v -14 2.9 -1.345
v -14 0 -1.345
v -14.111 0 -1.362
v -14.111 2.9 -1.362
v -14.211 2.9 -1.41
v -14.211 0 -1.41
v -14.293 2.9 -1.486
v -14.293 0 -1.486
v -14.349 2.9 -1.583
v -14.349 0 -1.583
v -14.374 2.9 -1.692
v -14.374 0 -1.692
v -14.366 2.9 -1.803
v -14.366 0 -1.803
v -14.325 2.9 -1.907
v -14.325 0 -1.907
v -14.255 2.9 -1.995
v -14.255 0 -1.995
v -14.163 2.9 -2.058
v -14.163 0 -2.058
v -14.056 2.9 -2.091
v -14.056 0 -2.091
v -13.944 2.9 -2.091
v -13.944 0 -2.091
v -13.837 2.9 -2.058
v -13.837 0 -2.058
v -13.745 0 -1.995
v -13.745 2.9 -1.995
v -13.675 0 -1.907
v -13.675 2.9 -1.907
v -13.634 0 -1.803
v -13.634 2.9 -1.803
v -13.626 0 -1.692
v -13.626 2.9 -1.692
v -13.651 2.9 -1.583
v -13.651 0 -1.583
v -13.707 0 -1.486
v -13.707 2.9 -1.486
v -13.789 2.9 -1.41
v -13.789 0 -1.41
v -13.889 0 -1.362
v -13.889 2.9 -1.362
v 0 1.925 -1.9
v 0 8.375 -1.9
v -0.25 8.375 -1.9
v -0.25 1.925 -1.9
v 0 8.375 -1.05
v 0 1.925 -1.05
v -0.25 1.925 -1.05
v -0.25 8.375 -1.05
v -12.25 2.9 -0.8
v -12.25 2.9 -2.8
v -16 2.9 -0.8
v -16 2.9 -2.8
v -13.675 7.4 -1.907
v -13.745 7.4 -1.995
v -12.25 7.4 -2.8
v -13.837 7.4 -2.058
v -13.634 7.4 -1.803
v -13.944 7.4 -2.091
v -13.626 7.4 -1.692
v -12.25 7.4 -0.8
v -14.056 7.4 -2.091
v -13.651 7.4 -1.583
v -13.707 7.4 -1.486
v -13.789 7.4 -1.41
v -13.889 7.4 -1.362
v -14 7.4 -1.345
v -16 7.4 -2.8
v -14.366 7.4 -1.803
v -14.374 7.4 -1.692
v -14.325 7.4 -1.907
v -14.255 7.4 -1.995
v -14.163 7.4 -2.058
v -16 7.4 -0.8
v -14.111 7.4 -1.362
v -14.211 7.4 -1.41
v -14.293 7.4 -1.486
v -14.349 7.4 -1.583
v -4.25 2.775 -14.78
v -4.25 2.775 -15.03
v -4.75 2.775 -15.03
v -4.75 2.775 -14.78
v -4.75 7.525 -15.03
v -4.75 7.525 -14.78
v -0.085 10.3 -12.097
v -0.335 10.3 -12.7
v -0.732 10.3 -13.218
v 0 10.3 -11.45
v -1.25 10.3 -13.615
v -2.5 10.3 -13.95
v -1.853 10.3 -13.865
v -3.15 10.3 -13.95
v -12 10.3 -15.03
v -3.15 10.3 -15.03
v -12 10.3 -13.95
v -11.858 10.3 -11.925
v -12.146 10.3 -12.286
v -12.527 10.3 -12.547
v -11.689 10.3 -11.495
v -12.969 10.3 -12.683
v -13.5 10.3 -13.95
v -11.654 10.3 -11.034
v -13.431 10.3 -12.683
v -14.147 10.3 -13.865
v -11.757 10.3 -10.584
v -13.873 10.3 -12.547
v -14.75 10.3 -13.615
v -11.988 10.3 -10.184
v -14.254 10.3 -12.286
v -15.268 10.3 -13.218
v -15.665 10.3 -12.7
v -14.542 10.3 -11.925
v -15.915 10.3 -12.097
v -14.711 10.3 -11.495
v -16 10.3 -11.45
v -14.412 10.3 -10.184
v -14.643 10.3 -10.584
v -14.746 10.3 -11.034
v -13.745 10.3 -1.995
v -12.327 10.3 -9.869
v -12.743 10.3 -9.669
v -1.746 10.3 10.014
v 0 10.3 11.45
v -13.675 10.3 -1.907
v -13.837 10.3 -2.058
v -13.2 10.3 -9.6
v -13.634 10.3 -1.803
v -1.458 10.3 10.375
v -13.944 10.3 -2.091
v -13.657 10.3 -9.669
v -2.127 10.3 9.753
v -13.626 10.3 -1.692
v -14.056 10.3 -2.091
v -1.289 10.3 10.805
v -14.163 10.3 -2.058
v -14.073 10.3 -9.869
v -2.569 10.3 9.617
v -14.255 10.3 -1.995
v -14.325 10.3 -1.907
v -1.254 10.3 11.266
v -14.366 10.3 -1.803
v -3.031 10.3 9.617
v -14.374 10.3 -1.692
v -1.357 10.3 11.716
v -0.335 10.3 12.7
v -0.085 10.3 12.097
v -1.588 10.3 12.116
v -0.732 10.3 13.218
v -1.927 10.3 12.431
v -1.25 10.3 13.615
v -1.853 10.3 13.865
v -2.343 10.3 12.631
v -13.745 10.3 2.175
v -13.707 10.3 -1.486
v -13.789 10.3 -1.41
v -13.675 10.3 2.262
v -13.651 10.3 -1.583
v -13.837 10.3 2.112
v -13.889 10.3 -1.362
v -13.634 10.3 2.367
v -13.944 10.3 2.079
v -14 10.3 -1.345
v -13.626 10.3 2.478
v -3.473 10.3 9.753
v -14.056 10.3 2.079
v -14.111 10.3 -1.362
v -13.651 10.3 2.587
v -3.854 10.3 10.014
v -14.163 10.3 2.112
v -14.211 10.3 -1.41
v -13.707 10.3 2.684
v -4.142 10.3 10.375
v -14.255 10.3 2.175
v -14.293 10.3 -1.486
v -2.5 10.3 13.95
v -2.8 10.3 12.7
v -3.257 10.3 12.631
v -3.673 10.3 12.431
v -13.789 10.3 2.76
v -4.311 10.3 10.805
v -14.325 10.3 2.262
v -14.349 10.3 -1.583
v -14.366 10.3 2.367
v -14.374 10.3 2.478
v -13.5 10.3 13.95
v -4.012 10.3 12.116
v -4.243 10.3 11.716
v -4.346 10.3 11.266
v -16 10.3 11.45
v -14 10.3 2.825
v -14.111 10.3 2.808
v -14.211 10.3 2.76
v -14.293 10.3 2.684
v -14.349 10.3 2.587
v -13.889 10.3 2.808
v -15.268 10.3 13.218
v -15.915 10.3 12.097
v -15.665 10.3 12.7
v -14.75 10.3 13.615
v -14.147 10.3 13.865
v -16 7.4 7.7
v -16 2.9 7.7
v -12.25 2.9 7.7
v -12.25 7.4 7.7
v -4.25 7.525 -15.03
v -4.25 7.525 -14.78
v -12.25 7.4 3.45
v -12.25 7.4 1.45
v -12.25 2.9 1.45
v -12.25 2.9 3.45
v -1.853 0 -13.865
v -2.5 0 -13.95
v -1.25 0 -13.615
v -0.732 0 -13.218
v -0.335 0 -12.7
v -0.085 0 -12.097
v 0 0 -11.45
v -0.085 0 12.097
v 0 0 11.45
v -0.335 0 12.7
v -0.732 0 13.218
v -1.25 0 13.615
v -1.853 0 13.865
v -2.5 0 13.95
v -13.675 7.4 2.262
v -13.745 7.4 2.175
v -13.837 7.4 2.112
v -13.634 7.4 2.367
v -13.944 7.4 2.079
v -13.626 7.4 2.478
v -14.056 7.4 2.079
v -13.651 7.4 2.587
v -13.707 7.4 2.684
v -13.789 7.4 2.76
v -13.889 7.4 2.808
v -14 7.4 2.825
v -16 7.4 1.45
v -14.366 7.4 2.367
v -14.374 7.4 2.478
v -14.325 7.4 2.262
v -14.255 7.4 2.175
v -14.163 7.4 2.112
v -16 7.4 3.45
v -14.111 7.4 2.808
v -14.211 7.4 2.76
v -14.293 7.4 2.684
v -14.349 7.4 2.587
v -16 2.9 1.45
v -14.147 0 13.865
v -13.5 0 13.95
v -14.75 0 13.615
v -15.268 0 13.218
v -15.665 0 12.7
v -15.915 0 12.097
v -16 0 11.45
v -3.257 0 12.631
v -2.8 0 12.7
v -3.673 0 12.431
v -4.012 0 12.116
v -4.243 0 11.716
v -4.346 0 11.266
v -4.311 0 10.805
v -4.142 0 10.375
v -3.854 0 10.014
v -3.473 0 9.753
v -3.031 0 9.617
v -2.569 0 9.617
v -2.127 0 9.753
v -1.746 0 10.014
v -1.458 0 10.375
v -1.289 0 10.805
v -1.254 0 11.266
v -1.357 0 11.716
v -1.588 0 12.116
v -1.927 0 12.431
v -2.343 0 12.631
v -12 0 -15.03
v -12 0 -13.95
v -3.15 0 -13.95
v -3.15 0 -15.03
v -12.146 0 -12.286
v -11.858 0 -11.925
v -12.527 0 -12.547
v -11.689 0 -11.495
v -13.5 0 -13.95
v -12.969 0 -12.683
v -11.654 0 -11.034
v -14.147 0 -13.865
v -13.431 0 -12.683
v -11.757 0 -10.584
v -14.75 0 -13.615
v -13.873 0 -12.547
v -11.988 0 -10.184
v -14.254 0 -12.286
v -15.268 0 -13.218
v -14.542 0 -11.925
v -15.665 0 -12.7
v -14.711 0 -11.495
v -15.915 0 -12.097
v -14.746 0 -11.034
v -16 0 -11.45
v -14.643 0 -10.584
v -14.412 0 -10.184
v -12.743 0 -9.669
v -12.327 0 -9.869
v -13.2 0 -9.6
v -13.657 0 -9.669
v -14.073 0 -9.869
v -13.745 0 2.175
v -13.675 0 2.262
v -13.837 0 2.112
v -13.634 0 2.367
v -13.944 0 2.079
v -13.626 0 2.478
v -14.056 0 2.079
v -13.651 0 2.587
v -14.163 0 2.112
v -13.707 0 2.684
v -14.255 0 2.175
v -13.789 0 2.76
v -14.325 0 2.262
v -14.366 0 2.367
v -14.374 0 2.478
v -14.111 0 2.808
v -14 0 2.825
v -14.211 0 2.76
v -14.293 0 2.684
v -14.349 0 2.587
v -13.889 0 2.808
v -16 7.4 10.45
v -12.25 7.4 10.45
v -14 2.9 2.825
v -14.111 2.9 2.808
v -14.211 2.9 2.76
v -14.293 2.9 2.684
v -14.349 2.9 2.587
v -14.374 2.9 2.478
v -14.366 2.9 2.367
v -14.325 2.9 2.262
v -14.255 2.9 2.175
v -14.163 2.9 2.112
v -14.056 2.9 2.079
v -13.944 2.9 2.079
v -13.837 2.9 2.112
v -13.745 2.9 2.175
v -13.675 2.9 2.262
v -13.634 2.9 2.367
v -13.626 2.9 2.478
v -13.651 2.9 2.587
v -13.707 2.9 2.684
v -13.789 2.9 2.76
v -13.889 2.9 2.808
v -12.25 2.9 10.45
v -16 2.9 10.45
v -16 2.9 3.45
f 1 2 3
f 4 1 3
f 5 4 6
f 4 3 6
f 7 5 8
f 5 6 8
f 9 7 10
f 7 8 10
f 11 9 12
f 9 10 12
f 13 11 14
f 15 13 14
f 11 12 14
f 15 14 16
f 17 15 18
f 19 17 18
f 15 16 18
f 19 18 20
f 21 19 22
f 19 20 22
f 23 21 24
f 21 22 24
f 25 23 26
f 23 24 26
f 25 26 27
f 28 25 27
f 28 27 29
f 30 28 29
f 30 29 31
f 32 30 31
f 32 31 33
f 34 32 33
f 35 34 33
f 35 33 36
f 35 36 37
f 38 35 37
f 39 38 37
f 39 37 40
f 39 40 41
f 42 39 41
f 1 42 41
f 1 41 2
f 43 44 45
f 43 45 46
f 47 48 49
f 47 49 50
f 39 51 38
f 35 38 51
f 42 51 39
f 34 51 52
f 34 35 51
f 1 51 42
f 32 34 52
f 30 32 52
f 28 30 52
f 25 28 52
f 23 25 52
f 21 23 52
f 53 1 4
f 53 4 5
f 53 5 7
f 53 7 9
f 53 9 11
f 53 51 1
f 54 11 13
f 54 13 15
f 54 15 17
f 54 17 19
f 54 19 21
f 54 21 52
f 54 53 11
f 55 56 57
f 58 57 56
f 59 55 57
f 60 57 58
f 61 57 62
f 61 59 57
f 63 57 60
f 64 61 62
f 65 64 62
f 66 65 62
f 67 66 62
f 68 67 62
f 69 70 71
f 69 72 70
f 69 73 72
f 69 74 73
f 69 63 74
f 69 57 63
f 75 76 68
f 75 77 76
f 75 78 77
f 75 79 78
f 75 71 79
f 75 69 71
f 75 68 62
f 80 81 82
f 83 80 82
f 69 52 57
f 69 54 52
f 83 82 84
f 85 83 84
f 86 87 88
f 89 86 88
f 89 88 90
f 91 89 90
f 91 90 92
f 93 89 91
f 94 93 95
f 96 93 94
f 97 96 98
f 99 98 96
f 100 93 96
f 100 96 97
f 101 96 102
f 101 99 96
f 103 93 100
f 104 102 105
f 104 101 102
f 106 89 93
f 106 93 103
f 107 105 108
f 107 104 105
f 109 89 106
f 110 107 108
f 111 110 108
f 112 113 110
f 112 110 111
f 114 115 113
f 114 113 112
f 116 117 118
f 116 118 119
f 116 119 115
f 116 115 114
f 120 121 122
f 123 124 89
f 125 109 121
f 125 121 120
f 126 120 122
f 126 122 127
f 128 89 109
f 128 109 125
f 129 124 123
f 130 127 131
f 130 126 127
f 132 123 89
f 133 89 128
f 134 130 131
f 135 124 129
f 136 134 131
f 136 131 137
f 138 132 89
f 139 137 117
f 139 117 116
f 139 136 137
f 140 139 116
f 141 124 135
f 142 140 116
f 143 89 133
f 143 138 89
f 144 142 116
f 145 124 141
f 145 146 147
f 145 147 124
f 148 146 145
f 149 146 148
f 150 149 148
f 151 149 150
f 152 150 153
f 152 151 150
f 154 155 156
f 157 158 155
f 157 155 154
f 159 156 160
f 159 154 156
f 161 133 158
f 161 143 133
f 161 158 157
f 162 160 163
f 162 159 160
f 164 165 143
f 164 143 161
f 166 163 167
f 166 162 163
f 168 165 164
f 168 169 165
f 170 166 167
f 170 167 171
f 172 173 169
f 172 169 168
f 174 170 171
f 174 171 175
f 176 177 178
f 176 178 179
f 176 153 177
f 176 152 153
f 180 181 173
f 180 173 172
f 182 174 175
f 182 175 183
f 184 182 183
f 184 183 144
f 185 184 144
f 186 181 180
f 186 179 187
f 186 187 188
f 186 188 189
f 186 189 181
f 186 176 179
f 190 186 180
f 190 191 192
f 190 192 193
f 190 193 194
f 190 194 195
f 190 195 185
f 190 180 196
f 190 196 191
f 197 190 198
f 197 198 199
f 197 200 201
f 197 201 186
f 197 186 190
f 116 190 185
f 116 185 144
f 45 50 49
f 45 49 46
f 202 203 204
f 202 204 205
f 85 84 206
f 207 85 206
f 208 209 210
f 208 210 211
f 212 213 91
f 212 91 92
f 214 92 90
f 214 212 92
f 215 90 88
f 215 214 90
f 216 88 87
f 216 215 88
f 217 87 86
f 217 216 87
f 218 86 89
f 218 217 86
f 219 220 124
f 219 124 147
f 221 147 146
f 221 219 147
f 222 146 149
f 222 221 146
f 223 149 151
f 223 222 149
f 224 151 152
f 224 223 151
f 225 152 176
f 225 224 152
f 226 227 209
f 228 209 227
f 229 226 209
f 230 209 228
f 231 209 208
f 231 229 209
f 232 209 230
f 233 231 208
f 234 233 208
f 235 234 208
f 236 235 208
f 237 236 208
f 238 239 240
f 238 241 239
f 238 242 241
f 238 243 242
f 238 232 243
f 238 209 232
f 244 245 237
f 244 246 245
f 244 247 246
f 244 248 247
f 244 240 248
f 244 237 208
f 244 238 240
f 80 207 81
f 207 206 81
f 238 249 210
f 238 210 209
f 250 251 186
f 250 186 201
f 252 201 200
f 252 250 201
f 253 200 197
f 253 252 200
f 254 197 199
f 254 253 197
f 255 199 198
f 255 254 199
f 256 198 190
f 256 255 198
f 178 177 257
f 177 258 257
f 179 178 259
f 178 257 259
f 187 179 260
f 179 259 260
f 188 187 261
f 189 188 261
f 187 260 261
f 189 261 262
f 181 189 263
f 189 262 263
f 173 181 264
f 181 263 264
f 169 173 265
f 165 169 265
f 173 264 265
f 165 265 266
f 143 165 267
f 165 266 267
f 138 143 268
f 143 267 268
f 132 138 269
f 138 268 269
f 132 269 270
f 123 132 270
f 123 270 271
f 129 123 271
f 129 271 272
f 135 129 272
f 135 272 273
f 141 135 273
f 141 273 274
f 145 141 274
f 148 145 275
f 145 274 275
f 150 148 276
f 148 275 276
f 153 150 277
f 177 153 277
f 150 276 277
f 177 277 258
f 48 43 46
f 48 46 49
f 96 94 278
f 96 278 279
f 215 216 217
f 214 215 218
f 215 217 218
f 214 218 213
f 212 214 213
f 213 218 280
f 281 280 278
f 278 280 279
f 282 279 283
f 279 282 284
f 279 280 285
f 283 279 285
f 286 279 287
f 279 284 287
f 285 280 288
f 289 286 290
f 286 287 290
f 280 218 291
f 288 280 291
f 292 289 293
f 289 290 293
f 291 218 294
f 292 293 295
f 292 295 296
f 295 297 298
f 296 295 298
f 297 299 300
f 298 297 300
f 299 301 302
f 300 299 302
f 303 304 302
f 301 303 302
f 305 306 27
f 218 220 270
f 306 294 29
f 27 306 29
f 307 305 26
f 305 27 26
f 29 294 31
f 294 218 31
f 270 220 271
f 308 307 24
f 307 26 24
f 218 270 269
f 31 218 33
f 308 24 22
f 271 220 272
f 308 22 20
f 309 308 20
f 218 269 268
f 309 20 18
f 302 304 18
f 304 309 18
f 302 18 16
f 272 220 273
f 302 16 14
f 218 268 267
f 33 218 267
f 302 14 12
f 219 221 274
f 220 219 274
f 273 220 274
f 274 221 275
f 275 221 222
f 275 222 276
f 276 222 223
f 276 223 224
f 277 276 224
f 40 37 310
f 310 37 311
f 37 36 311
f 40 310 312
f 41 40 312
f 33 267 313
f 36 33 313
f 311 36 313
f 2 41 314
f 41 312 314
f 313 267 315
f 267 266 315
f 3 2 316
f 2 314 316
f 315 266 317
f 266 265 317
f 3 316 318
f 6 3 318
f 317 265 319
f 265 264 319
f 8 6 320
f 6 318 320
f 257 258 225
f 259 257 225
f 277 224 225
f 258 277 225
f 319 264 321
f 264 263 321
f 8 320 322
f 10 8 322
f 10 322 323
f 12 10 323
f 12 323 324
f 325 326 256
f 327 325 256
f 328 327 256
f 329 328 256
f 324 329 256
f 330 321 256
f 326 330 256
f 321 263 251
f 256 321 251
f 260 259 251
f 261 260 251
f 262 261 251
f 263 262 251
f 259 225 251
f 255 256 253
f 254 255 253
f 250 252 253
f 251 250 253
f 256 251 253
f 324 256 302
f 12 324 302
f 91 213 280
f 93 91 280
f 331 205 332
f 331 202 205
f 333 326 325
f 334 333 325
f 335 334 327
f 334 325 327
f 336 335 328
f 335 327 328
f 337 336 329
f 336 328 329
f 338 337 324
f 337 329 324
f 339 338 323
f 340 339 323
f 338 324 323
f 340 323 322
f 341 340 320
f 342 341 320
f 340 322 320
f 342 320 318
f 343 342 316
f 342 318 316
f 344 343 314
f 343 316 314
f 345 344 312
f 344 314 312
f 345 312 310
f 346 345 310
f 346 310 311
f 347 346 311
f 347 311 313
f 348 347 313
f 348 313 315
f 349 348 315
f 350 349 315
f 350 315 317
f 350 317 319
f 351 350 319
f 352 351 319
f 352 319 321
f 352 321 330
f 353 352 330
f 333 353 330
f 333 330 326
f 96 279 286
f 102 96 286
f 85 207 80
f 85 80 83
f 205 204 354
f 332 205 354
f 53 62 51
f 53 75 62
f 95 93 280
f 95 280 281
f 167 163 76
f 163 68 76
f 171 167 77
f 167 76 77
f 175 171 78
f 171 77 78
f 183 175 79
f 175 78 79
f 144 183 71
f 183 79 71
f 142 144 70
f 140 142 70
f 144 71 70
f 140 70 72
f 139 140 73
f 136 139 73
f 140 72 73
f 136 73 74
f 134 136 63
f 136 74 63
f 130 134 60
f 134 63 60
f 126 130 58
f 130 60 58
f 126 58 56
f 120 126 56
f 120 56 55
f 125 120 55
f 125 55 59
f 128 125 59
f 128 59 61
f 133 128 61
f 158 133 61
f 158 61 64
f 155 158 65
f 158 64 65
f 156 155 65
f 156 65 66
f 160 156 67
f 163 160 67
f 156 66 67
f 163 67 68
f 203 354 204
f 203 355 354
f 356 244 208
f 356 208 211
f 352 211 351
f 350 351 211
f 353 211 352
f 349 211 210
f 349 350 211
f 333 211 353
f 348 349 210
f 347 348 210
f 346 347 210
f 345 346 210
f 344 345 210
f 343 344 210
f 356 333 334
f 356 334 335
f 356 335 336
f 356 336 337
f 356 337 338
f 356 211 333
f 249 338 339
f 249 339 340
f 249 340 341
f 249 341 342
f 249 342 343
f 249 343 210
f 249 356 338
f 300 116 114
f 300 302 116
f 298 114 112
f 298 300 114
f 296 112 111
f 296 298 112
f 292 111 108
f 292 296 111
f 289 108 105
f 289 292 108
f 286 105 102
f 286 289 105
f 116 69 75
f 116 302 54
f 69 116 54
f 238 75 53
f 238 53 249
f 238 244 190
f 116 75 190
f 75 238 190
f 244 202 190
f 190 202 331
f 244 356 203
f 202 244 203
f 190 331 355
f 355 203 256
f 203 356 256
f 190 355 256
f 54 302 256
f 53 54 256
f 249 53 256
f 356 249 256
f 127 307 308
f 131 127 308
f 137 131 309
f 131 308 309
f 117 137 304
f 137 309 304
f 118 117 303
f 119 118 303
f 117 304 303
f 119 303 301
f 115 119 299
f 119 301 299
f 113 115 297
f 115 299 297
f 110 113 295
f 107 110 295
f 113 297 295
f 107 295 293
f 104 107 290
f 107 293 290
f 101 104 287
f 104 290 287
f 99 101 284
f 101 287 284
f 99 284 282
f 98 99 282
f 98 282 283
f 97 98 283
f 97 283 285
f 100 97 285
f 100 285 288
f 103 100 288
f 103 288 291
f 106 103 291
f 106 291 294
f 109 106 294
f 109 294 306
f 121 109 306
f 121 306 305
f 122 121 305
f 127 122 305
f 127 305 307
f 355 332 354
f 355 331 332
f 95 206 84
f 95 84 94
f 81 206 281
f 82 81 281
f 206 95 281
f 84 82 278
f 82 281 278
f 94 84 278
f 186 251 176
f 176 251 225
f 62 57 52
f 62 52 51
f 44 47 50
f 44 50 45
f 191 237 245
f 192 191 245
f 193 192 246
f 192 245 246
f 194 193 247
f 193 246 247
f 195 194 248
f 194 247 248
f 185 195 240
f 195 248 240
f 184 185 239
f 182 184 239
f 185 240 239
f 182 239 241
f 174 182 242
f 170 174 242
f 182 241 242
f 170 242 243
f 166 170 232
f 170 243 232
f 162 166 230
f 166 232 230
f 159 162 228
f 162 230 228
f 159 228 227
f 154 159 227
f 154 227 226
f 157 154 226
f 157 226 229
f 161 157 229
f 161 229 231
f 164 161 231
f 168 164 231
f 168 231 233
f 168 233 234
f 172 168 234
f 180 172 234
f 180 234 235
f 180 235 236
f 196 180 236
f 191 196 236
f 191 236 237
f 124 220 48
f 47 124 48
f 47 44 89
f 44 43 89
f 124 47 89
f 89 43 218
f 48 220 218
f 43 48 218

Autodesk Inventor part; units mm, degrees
ref_plane "YZ Plane" through (0, 0, 0) normal (1, 0, 0) x (0, 1, 0)
ref_plane "XZ Plane" through (0, 0, 0) normal (0, 1, 0) x (-1, 0, 0)
ref_plane "XY Plane" through (0, 0, 0) normal (0, 0, 1) x (1, 0, 0)
sketch "Sketch1" plane through (0, 0, 0) normal (0, 1, 0) x (-1, 0, 0)
  line L0 (13.5, 13.95) -> (2.5, 13.95)
  line L1 (0, 11.45) -> (0, -11.45)
  line L2 (16, -11.45) -> (16, 11.45)
  line L3 (3.15, -13.95) -> (3.15, -15.03)
  line L4 (3.15, -15.03) -> (12, -15.03)
  line L5 (12, -15.03) -> (12, -13.95)
  line L6 (2.5, -13.95) -> (3.15, -13.95)
  line L7 (12, -13.95) -> (13.5, -13.95)
  arc A0 (16, 11.45) -> (13.5, 13.95) centre (13.5, 11.45) ccw
  arc A1 (2.5, 13.95) -> (0, 11.45) centre (2.5, 11.45) ccw
  arc A2 (0, -11.45) -> (2.5, -13.95) centre (2.5, -11.45) ccw
  arc A3 (13.5, -13.95) -> (16, -11.45) centre (13.5, -11.45) ccw
  point P0 (0, 0)
  point P1 (0, 0)
  dimension "d1" = 16
  dimension "d3" = 8.85
  dimension "d4" = 4
  dimension "d5" = 27.9
  dimension "d6" = 2.5
  dimension "d7" = 1.08
extrude "Extrusion1" add sketch "Sketch1" along normal blind 10.3
sketch "Sketch2" plane through (0, 10.3, 0) normal (0, 1, 0) x (1, 0, 0)
  line L0 (-16, 11.45) -> (-16, -11.45) projected
  line L1 (-12, 13.95) -> (-13.5, 13.95) projected
  line L2 (0, -11.45) -> (0, 11.45) projected
  line L3 (-13.5, -13.95) -> (-2.5, -13.95) projected
  point P0 (0, 0)
  point P1 (-13.2, 11.15)
  point P2 (-2.8, -11.15)
  dimension "d10" = 2.8
  dimension "d11" = 2.8
  dimension "d12" = 2.8
  dimension "d13" = 2.8
  dimension "d48" = 22.3
  dimension "d49" = 10.4
hole "Hole1" at (-13.2, 10.3, -11.15) at (-2.8, 10.3, 11.15) direction (0, -1, 0) diameter 3.1 end through all
sketch "Sketch3" plane through (-16, 0, -11.45) normal (-1, 0, 0) x (0, 0, 1)
  line L0 (10.65, 2.9) -> (8.65, 2.9)
  line L1 (8.65, 2.9) -> (8.65, 7.4)
  line L2 (8.65, 7.4) -> (10.65, 7.4)
  line L3 (10.65, 7.4) -> (10.65, 2.9)
  line L4 (14.9, 2.9) -> (12.9, 2.9)
  line L5 (12.9, 2.9) -> (12.9, 7.4)
  line L6 (12.9, 7.4) -> (14.9, 7.4)
  line L7 (14.9, 7.4) -> (14.9, 2.9)
  line L8 (21.9, 2.9) -> (19.15, 2.9)
  line L9 (19.15, 2.9) -> (19.15, 7.4)
  line L10 (19.15, 7.4) -> (21.9, 7.4)
  line L11 (21.9, 7.4) -> (21.9, 2.9)
  line L12 (25.4, 0) -> (25.4, 10.3) construction
  line L13 (25.4, 5.15) -> (-3.58, 5.15) construction
  line L14 (-3.58, 0) -> (-3.58, 10.3) construction
  point P0 (11.45, 0)
  point P1 (21.9, 5.15)
  point P2 (10.91, 5.15)
  dimension "d21" = 3.5
  dimension "d22" = 2.75
  dimension "d23" = 4.25
  dimension "d24" = 2
  dimension "d25" = 2
  dimension "d26" = 2.25
  dimension "d27" = 4.5
extrude "Extrusion2" cut sketch "Sketch3" against normal blind 3.75
sketch "Sketch4" plane through (0, 10.3, 0) normal (0, 1, 0) x (1, 0, 0)
  line L0 (-16, -3.45) -> (-16, -1.45) construction
  line L1 (-16, -3.45) -> (-12.25, -3.45) construction
  line L2 (-12.25, -3.45) -> (-12.25, -1.45) construction
  line L3 (-16, -1.45) -> (-12.25, -1.45) construction
  line L4 (-16, 0.8) -> (-16, 2.8) construction
  line L5 (-16, 0.8) -> (-12.25, 0.8) construction
  line L6 (-12.25, 0.8) -> (-12.25, 2.8) construction
  line L7 (-16, 2.8) -> (-12.25, 2.8) construction
  line L8 (-14, -2.45) -> (-14, 1.7199) construction
  line L9 (-14, -2.45) -> (-12.25, -2.45) construction
  line L10 (-12.25, -3.45) -> (-12.25, -1.45) construction
  line L11 (-14, 1.7199) -> (-12.25, 1.7199) construction
  line L12 (-12.25, 0.8) -> (-12.25, 2.8) construction
  point P0 (0, 0)
  dimension "d30" = 2
hole "Hole2" at (-14, 10.3, 2.45) at (-14, 10.3, -1.7199) direction (0, -1, 0) diameter 0.75 end through all
sketch "Sketch5" plane through (-3.15, 0, -15.03) normal (0, 0, -1) x (-1, 0, 0)
  line L0 (1.6, 7.525) -> (1.1, 7.525)
  line L1 (1.1, 7.525) -> (1.1, 2.775)
  line L2 (1.1, 2.775) -> (1.6, 2.775)
  line L3 (1.6, 2.775) -> (1.6, 7.525)
  line L4 (12.85, 0) -> (12.85, 10.3) construction
  line L5 (12.85, 5.15) -> (1.6, 5.15) construction
  point P0 (-3.15, 0)
  dimension "d38" = 0.5
  dimension "d39" = 4.75
  dimension "d40" = 11.25
extrude "Extrusion3" cut sketch "Sketch5" against normal blind 0.25
sketch "Sketch6" plane through (0, 0, 11.45) normal (1, 0, 0) x (0, 0, -1)
  line L0 (12.5, 8.375) -> (13.35, 8.375)
  line L1 (13.35, 8.375) -> (13.35, 1.925)
  line L2 (13.35, 1.925) -> (12.5, 1.925)
  line L3 (12.5, 1.925) -> (12.5, 8.375)
  line L4 (-2.5, 0) -> (-2.5, 10.3) projected
  line L5 (-2.5, 0) -> (-2.5, 10.3) projected
  line L6 (-2.5, 5.15) -> (12.5, 5.15) construction
  point P0 (11.45, 0)
  dimension "d43" = 0.85
  dimension "d44" = 6.45
  dimension "d45" = 15
extrude "Extrusion4" cut sketch "Sketch6" against normal blind 0.25
equation "\"d11\" = d10"
equation "\"d12\" = d10"
equation "\"d13\" = d10"
properties part number "Housing" material "ABS Plastic"
